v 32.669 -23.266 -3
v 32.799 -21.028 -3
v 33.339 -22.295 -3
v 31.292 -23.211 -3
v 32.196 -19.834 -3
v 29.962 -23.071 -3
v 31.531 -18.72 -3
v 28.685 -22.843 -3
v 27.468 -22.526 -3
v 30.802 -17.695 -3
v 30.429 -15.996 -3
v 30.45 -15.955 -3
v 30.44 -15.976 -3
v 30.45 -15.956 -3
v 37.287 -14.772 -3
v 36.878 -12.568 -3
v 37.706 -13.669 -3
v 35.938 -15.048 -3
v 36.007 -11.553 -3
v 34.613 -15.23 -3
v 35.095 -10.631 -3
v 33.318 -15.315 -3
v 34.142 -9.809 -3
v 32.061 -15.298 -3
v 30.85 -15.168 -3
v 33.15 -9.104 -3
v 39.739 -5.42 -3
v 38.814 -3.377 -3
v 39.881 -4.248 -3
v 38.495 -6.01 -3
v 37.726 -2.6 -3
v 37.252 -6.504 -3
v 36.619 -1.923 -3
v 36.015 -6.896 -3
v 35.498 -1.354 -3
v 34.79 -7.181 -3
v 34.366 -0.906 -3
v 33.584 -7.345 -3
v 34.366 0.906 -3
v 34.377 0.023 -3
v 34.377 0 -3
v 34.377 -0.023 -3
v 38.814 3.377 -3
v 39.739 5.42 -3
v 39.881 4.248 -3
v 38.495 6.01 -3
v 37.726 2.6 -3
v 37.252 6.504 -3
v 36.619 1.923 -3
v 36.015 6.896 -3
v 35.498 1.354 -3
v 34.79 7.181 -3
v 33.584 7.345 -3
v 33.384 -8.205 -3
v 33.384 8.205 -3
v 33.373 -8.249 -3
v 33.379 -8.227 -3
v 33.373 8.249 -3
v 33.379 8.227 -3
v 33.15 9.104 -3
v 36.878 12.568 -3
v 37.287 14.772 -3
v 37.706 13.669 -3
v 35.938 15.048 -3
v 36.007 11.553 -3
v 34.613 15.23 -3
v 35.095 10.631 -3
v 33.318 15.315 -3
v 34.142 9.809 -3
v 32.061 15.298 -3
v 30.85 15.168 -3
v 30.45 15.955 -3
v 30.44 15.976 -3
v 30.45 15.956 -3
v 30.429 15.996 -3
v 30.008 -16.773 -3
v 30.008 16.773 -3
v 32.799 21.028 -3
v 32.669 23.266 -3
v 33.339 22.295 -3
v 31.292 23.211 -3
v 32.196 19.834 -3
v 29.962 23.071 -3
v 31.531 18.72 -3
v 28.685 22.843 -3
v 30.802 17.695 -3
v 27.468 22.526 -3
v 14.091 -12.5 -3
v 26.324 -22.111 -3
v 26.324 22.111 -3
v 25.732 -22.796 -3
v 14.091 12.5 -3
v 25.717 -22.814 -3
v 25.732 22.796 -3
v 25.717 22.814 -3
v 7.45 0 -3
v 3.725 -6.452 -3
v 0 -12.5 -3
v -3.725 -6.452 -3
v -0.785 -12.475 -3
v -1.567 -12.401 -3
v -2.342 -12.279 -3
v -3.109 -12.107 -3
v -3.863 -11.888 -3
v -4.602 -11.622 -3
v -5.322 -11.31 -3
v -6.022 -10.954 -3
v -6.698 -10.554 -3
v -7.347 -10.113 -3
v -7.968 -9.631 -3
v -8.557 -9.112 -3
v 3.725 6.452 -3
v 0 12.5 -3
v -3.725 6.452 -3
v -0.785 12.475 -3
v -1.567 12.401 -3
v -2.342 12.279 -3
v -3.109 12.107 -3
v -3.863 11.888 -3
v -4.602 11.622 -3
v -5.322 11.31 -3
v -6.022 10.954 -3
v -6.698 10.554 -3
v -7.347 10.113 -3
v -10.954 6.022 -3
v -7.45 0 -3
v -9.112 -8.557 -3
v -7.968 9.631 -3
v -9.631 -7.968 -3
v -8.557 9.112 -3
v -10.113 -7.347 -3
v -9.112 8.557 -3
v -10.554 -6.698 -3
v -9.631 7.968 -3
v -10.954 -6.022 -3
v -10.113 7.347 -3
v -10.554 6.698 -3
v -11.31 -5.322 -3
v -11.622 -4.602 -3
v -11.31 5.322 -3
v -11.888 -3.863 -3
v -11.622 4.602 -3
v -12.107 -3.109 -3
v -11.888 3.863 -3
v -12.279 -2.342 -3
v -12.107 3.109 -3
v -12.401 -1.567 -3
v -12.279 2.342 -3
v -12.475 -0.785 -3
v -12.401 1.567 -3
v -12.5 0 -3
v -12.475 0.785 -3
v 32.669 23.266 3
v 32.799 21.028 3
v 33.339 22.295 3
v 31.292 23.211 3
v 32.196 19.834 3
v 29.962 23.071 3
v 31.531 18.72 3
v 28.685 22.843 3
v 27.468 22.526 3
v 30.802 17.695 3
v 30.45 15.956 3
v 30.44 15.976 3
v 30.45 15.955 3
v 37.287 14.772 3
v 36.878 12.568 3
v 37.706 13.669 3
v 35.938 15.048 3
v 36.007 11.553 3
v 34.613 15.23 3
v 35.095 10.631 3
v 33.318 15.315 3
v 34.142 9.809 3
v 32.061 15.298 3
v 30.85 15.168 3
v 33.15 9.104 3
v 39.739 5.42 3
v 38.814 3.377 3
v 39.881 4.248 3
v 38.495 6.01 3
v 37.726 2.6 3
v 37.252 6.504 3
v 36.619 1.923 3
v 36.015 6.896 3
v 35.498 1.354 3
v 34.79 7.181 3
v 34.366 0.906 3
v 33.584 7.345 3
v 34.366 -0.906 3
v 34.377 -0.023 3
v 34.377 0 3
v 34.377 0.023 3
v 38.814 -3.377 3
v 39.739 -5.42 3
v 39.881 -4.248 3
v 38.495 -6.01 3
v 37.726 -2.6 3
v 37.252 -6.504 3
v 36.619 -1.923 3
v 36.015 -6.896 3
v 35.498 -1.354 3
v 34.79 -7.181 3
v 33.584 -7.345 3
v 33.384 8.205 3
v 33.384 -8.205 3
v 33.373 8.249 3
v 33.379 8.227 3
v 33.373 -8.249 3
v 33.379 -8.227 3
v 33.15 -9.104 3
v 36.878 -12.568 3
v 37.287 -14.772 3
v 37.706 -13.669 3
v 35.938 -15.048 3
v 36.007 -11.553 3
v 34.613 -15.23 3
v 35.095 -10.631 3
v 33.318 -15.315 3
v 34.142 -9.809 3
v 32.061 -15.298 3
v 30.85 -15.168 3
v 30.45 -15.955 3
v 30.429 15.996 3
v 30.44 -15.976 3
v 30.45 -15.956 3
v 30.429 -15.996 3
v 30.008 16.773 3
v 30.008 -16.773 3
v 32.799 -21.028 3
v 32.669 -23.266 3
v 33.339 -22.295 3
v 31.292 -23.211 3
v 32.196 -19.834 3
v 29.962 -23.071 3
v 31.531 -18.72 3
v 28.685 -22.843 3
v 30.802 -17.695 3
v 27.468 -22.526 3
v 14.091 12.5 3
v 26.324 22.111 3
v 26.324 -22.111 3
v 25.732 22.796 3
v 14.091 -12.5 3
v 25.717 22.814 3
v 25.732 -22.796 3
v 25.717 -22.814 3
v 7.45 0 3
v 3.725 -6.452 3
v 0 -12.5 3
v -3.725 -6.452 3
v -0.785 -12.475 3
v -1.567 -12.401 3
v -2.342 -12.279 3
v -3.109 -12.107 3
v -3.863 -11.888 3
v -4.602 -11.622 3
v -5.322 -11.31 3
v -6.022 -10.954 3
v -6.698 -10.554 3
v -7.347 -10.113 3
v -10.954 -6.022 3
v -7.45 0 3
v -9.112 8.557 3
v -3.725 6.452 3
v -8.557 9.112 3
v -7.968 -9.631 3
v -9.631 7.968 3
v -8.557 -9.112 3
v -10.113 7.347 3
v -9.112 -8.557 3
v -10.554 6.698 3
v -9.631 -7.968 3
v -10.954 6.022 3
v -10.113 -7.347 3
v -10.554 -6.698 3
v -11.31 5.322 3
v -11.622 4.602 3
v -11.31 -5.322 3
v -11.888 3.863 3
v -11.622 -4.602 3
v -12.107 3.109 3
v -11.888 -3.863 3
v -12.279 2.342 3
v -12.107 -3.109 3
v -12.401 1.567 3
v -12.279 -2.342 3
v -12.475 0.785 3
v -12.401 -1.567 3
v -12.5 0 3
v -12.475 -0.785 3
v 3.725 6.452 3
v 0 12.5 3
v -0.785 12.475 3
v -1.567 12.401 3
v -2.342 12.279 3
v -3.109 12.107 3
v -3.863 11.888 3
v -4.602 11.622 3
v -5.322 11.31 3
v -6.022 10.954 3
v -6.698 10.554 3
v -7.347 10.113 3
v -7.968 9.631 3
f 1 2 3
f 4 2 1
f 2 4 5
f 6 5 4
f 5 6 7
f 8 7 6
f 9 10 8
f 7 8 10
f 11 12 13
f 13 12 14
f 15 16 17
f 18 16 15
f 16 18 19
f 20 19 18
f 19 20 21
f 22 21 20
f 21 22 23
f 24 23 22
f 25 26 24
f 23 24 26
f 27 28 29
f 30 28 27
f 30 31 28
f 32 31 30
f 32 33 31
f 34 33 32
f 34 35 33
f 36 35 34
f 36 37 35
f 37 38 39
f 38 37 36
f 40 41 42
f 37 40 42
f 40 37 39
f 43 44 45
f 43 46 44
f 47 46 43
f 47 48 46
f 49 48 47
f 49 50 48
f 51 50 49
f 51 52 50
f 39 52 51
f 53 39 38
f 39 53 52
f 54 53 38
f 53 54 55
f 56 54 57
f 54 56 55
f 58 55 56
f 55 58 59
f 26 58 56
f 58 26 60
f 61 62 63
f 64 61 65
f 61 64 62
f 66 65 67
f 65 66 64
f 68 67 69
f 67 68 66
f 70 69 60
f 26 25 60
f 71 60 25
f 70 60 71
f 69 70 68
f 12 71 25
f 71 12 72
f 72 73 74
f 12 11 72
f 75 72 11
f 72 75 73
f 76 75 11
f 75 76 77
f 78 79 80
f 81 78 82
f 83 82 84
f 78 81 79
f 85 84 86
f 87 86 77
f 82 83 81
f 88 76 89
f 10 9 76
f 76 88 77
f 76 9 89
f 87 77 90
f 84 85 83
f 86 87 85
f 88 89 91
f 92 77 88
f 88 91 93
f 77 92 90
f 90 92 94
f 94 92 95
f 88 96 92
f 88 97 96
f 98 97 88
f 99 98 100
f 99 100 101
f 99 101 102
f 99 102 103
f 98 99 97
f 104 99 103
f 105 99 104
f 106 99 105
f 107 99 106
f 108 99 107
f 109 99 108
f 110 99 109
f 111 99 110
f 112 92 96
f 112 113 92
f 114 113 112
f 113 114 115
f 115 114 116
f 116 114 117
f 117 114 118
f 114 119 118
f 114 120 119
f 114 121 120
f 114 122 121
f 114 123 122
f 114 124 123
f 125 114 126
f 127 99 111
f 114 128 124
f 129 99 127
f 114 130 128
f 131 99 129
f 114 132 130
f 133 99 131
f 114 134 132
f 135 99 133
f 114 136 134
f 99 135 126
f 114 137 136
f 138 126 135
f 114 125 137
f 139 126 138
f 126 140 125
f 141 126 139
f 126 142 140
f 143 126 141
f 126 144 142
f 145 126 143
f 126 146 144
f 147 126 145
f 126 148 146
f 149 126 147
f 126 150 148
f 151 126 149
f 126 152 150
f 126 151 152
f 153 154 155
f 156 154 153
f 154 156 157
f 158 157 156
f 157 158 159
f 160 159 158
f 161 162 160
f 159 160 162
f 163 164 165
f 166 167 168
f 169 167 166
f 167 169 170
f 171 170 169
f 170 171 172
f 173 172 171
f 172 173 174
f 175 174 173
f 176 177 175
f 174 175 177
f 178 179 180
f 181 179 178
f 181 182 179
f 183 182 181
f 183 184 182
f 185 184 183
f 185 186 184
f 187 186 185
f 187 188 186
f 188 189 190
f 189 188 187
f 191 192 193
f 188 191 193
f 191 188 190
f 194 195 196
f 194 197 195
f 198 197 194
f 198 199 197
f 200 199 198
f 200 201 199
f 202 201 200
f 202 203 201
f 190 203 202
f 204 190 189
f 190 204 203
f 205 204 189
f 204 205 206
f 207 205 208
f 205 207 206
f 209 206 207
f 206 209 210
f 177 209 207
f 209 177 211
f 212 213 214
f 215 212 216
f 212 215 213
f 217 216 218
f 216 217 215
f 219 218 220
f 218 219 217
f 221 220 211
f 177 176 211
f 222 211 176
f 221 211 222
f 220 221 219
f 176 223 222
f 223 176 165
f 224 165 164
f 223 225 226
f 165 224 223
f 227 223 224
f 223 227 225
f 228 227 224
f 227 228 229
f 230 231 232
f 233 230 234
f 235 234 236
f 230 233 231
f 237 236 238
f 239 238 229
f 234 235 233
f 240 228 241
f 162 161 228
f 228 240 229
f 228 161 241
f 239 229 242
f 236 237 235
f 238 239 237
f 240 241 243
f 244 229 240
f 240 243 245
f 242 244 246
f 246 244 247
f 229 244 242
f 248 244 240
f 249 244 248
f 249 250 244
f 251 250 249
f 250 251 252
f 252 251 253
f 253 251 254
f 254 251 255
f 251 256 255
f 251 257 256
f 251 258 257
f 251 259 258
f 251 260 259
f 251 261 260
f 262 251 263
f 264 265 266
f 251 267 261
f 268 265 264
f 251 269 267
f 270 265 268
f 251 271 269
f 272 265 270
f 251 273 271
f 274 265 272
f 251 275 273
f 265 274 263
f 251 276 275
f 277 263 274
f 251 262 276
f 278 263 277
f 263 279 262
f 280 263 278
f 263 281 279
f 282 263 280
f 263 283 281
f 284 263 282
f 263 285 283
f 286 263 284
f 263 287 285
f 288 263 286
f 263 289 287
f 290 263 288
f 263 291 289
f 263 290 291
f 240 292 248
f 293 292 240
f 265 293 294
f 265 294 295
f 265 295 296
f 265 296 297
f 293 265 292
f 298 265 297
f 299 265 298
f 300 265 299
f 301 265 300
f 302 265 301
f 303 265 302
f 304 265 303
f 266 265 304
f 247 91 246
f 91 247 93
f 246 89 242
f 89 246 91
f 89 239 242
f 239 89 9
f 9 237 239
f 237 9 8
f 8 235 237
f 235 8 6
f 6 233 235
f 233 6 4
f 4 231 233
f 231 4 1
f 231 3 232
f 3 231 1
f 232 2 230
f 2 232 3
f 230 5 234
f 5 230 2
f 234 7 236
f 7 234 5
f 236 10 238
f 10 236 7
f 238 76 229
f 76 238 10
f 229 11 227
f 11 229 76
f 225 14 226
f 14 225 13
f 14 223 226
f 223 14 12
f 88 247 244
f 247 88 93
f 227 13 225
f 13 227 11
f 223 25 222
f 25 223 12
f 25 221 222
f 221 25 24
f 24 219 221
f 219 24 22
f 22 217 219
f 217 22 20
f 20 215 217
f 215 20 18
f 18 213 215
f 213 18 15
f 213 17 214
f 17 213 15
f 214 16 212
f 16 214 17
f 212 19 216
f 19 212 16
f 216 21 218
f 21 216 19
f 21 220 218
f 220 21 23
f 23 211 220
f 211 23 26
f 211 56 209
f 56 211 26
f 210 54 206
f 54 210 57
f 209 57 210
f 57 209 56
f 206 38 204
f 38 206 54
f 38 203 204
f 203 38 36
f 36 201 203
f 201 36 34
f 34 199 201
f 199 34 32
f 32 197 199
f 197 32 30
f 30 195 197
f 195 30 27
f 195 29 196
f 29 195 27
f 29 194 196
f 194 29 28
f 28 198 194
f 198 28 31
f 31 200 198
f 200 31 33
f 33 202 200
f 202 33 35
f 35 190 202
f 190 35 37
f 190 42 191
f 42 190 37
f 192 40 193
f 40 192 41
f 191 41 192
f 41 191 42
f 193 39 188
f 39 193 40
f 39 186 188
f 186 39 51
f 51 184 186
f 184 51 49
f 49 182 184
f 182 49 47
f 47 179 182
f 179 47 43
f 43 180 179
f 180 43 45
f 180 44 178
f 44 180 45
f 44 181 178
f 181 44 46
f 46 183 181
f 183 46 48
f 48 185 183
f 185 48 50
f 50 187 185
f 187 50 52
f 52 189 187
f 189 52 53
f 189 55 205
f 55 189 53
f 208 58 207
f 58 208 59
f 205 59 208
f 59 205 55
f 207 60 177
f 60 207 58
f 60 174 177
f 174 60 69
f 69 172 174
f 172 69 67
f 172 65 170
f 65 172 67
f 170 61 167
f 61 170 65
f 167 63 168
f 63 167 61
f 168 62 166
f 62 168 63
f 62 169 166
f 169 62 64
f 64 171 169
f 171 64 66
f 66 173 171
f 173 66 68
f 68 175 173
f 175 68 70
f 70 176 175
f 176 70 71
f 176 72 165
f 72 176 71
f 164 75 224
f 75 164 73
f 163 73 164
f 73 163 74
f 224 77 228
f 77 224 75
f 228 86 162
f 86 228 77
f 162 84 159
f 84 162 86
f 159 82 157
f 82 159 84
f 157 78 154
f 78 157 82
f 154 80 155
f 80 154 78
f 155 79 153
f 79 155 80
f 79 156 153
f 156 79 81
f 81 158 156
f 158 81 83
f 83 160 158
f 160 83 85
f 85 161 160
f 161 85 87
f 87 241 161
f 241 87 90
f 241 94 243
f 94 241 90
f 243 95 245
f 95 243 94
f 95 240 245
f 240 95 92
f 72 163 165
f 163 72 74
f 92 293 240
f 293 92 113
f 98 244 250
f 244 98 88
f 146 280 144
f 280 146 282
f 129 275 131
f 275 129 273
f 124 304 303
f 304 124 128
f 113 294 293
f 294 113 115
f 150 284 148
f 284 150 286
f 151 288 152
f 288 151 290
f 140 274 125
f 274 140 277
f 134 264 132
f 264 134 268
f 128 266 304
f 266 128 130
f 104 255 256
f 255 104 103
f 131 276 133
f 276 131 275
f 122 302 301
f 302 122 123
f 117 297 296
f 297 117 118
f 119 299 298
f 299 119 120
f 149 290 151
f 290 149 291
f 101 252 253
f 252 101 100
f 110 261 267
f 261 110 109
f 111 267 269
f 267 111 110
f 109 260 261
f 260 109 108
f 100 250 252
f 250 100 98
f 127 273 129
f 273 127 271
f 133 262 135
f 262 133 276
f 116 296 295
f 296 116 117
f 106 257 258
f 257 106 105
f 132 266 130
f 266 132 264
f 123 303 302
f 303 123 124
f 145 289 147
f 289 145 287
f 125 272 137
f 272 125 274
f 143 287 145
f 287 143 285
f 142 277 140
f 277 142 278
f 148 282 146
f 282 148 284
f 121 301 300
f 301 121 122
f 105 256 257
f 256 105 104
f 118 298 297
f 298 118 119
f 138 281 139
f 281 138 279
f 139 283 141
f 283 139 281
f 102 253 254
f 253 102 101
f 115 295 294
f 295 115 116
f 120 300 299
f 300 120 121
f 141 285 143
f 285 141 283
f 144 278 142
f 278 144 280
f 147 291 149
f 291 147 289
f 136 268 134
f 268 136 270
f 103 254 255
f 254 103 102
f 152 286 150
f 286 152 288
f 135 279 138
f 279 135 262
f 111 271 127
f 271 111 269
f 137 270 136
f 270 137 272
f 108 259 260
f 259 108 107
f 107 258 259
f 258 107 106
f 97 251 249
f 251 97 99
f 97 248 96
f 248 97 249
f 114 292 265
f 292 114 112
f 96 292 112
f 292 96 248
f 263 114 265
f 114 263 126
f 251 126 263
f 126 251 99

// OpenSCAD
//////////////////////////////////////////////////////////////////////////////////////////////
// Public Domain Parametric Involute Spur Gear (and involute helical gear and involute rack)
// version 1.1
// by Leemon Baird, 2011, Leemon@Leemon.com
//http://www.thingiverse.com/thing:5505
//
// This file is public domain.  Use it for any purpose, including commercial
// applications.  Attribution would be nice, but is not required.  There is
// no warranty of any kind, including its correctness, usefulness, or safety.
// 
// This is parameterized involute spur (or helical) gear.  It is much simpler and less powerful than
// others on Thingiverse.  But it is public domain.  I implemented it from scratch from the 
// descriptions and equations on Wikipedia and the web, using Mathematica for calculations and testing,
// and I now release it into the public domain.
//
//		http://en.wikipedia.org/wiki/Involute_gear
//		http://en.wikipedia.org/wiki/Gear
//		http://en.wikipedia.org/wiki/List_of_gear_nomenclature
//		http://gtrebaol.free.fr/doc/catia/spur_gear.html
//		http://www.cs.cmu.edu/~rapidproto/mechanisms/chpt7.html
//
// The module gear() gives an involute spur gear, with reasonable defaults for all the parameters.
// Normally, you should just choose the first 4 parameters, and let the rest be default values.
// The module gear() gives a gear in the XY plane, centered on the origin, with one tooth centered on
// the positive Y axis.  The various functions below it take the same parameters, and return various
// measurements for the gear.  The most important is pitch_radius, which tells how far apart to space
// gears that are meshing, and adendum_radius, which gives the size of the region filled by the gear.
// A gear has a "pitch circle", which is an invisible circle that cuts through the middle of each
// tooth (though not the exact center). In order for two gears to mesh, their pitch circles should 
// just touch.  So the distance between their centers should be pitch_radius() for one, plus pitch_radius() 
// for the other, which gives the radii of their pitch circles.
//
// In order for two gears to mesh, they must have the same mm_per_tooth and pressure_angle parameters.  
// mm_per_tooth gives the number of millimeters of arc around the pitch circle covered by one tooth and one
// space between teeth.  The pitch angle controls how flat or bulged the sides of the teeth are.  Common
// values include 14.5 degrees and 20 degrees, and occasionally 25.  Though I've seen 28 recommended for
// plastic gears. Larger numbers bulge out more, giving stronger teeth, so 28 degrees is the default here.
//
// The ratio of number_of_teeth for two meshing gears gives how many times one will make a full 
// revolution when the the other makes one full revolution.  If the two numbers are coprime (i.e. 
// are not both divisible by the same number greater than 1), then every tooth on one gear
// will meet every tooth on the other, for more even wear.  So coprime numbers of teeth are good.
//
// The module rack() gives a rack, which is a bar with teeth.  A rack can mesh with any
// gear that has the same mm_per_tooth and pressure_angle.
//
// Some terminology: 
// The outline of a gear is a smooth circle (the "pitch circle") which has mountains and valleys
// added so it is toothed.  So there is an inner circle (the "root circle") that touches the 
// base of all the teeth, an outer circle that touches the tips of all the teeth,
// and the invisible pitch circle in between them.  There is also a "base circle", which can be smaller than
// all three of the others, which controls the shape of the teeth.  The side of each tooth lies on the path 
// that the end of a string would follow if it were wrapped tightly around the base circle, then slowly unwound.  
// That shape is an "involute", which gives this type of gear its name.
//
//////////////////////////////////////////////////////////////////////////////////////////////

//An involute spur gear, with reasonable defaults for all the parameters.
//Normally, you should just choose the first 4 parameters, and let the rest be default values.
//Meshing gears must match in mm_per_tooth, pressure_angle, and twist,
//and be separated by the sum of their pitch radii, which can be found with pitch_radius().
module gear (
	mm_per_tooth    = 3,    //this is the "circular pitch", the circumference of the pitch circle divided by the number of teeth
	number_of_teeth = 11,   //total number of teeth around the entire perimeter
	thickness       = 6,    //thickness of gear in mm
	hole_diameter   = 3,    //diameter of the hole in the center, in mm
	twist           = 0,    //teeth rotate this many degrees from bottom of gear to top.  360 makes the gear a screw with each thread going around once
	teeth_to_hide   = 0,    //number of teeth to delete to make this only a fraction of a circle
	pressure_angle  = 28,   //Controls how straight or bulged the tooth sides are. In degrees.
	clearance       = 0.0,  //gap between top of a tooth on one gear and bottom of valley on a meshing gear (in millimeters)
	backlash        = 0.0   //gap between two meshing teeth, in the direction along the circumference of the pitch circle
) {
	assign(pi = 3.1415926)
	assign(p  = mm_per_tooth * number_of_teeth / pi / 2)  //radius of pitch circle
	assign(c  = p + mm_per_tooth / pi - clearance)        //radius of outer circle
	assign(b  = p*cos(pressure_angle))                    //radius of base circle
	assign(r  = p-(c-p)-clearance)                        //radius of root circle
	assign(t  = mm_per_tooth/2-backlash/2)                //tooth thickness at pitch circle
	assign(k  = -iang(b, p) - t/2/p/pi*180) {             //angle to where involute meets base circle on each side of tooth
		difference() {
			for (i = [0:number_of_teeth-teeth_to_hide-1] )
				rotate([0,0,i*360/number_of_teeth])
					linear_extrude(height = thickness, center = true, convexity = 10, twist = twist)
						polygon(
							points=[
								[0, -hole_diameter/10],
								polar(r, -181/number_of_teeth),
								polar(r, r<b ? k : -180/number_of_teeth),
								q7(0/5,r,b,c,k, 1),q7(1/5,r,b,c,k, 1),q7(2/5,r,b,c,k, 1),q7(3/5,r,b,c,k, 1),q7(4/5,r,b,c,k, 1),q7(5/5,r,b,c,k, 1),
								q7(5/5,r,b,c,k,-1),q7(4/5,r,b,c,k,-1),q7(3/5,r,b,c,k,-1),q7(2/5,r,b,c,k,-1),q7(1/5,r,b,c,k,-1),q7(0/5,r,b,c,k,-1),
								polar(r, r<b ? -k : 180/number_of_teeth),
								polar(r, 181/number_of_teeth)
							],
 							paths=[[0,1,2,3,4,5,6,7,8,9,10,11,12,13,14,15,16]]
						);
			cylinder(h=2*thickness+1, r=hole_diameter/2, center=true, $fn=20);
		}
	}
};	
//these 4 functions are used by gear
function polar(r,theta)   = r*[sin(theta), cos(theta)];                            //convert polar to cartesian coordinates
function iang(r1,r2)      = sqrt((r2/r1)*(r2/r1) - 1)/3.1415926*180 - acos(r1/r2); //unwind a string this many degrees to go from radius r1 to radius r2
function q7(f,r,b,r2,t,s) = q6(b,s,t,(1-f)*max(b,r)+f*r2);                         //radius a fraction f up the curved side of the tooth 
function q6(b,s,t,d)      = polar(d,s*(iang(b,d)+t));                              //point at radius d on the involute curve

//a rack, which is a straight line with teeth (the same as a segment from a giant gear with a huge number of teeth).
//The "pitch circle" is a line along the X axis.
module rack (
	mm_per_tooth    = 3,    //this is the "circular pitch", the circumference of the pitch circle divided by the number of teeth
	number_of_teeth = 11,   //total number of teeth along the rack
	thickness       = 6,    //thickness of rack in mm (affects each tooth)
	height          = 120,   //height of rack in mm, from tooth top to far side of rack.
	pressure_angle  = 28,   //Controls how straight or bulged the tooth sides are. In degrees.
	backlash        = 0.0   //gap between two meshing teeth, in the direction along the circumference of the pitch circle
) {
	assign(pi = 3.1415926)
	assign(a = mm_per_tooth / pi) //addendum
	assign(t = a*cos(pressure_angle)-1)         //tooth side is tilted so top/bottom corners move this amount
		for (i = [0:number_of_teeth-1] )
			translate([i*mm_per_tooth,0,0])
				linear_extrude(height = thickness, center = true, convexity = 10)
					polygon(
						points=[
							[-mm_per_tooth * 3/4,                 a-height],
							[-mm_per_tooth * 3/4 - backlash,     -a],
							[-mm_per_tooth * 1/4 + backlash - t, -a],
							[-mm_per_tooth * 1/4 + backlash + t,  a],
							[ mm_per_tooth * 1/4 - backlash - t,  a],
							[ mm_per_tooth * 1/4 - backlash + t, -a],
							[ mm_per_tooth * 3/4 + backlash,     -a],
							[ mm_per_tooth * 3/4,                 a-height],
						],
						paths=[[0,1,2,3,4,5,6,7]]
					);
};	

//These 5 functions let the user find the derived dimensions of the gear.
//A gear fits within a circle of radius outer_radius, and two gears should have
//their centers separated by the sum of their pictch_radius.
function circular_pitch  (mm_per_tooth=3) = mm_per_tooth;                     //tooth density expressed as "circular pitch" in millimeters
function diametral_pitch (mm_per_tooth=3) = 3.1415926 / mm_per_tooth;         //tooth density expressed as "diametral pitch" in teeth per millimeter
function module_value    (mm_per_tooth=3) = mm_per_tooth / pi;                //tooth density expressed as "module" or "modulus" in millimeters
function pitch_radius    (mm_per_tooth=3,number_of_teeth=11) = mm_per_tooth * number_of_teeth / 3.1415926 / 2;
function outer_radius    (mm_per_tooth=3,number_of_teeth=11,clearance=0.1)    //The gear fits entirely within a cylinder of this radius.
	= mm_per_tooth*(1+number_of_teeth/2)/3.1415926  - clearance;              

//////////////////////////////////////////////////////////////////////////////////////////////
//example gear train.  
//Try it with OpenSCAD View/Animate command with 20 steps and 24 FPS.
//The gears will continue to be rotated to mesh correctly if you change the number of teeth.

n1 = 11; //red gear number of teeth
n2 = 20; //green gear
n3 = 6;  //blue gear
n4 = 26; //orange gear
n5 = 8;  //gray rack
mm_per_tooth = 9; //all meshing gears need the same mm_per_tooth (and the same pressure_angle)
thickness    = 6;
hole         = 3;
height       = 12;

d1 =pitch_radius(mm_per_tooth,n1);
d12=pitch_radius(mm_per_tooth,n1) + pitch_radius(mm_per_tooth,n2);
d13=pitch_radius(mm_per_tooth,n1) + pitch_radius(mm_per_tooth,n3);
d14=pitch_radius(mm_per_tooth,n1) + pitch_radius(mm_per_tooth,n4);

cw = 25;
cl = 20;

module dira() {
    zz = 10;
    difference() {
    cylinder(d=5.4, h=zz-1,$fn=100, center=true);
    translate([1.52, -5, -zz/2]) cube([10, 10, zz]);
    translate([-11.52, -5, -zz/2]) cube([10, 10, zz]);
    }
}


//translate([ 0,    0, 0]) rotate([0,0, $t*360/n1])                 color([1.00,0.75,0.75]) gear(mm_per_tooth,n1,thickness,hole);
//translate([ 0,  d12, 0]) rotate([0,0,-($t+n2/2-0*n1+1/2)*360/n2]) color([0.75,1.00,0.75]) gear(mm_per_tooth,n2,thickness,hole,0,108);
//translate([ d13,  0, 0]) rotate([0,0,-($t-n3/4+n1/4+1/2)*360/n3]) color([0.75,0.75,1.00]) gear(mm_per_tooth,n3,thickness,hole);
module male() {
    difference() {
translate([ 0,  0, 0]) rotate([0,0,-($t-n3/4+n1/4+1/2)*360/n3]) color([0.75,0.75,1.00]) gear(mm_per_tooth,n3,thickness,hole);
        dira();
    }
}

module bazmekBezDiry() {
translate([0,  0, 0]) rotate([0,0,-($t-n4/4-n1/4+1/2-floor(n4/4)-2.25)*360/n4]) color([1.00,0.75,0.50]) gear(mm_per_tooth,n4,thickness,0,0,n4-6);
//translate([(-floor(n5/2)-floor(n1/2)+$t+n1/2-1/2)*9, -d1+0.0, 0]) rotate([0,0,0]) color([0.75,0.75,0.75]) rack(mm_per_tooth,n5,thickness,height);
translate([-cl+20,  -cw/2, -thickness/2]) cube([cl, cw, thickness]);
    translate([0,  0, 0]) cylinder(d=cw, h=thickness,$fn=100, center=true);
}

module bazmek() {
difference() {
    bazmekBezDiry();
    translate([0,  0, -thickness]) cylinder(d=14.9, h=30,$fn=6, center=true); // sroub M8
    //translate([0,  0, -thickness]) cylinder(d=8, h=30,$fn=100, center=true); 
}
}

    
//male();    
bazmek();
